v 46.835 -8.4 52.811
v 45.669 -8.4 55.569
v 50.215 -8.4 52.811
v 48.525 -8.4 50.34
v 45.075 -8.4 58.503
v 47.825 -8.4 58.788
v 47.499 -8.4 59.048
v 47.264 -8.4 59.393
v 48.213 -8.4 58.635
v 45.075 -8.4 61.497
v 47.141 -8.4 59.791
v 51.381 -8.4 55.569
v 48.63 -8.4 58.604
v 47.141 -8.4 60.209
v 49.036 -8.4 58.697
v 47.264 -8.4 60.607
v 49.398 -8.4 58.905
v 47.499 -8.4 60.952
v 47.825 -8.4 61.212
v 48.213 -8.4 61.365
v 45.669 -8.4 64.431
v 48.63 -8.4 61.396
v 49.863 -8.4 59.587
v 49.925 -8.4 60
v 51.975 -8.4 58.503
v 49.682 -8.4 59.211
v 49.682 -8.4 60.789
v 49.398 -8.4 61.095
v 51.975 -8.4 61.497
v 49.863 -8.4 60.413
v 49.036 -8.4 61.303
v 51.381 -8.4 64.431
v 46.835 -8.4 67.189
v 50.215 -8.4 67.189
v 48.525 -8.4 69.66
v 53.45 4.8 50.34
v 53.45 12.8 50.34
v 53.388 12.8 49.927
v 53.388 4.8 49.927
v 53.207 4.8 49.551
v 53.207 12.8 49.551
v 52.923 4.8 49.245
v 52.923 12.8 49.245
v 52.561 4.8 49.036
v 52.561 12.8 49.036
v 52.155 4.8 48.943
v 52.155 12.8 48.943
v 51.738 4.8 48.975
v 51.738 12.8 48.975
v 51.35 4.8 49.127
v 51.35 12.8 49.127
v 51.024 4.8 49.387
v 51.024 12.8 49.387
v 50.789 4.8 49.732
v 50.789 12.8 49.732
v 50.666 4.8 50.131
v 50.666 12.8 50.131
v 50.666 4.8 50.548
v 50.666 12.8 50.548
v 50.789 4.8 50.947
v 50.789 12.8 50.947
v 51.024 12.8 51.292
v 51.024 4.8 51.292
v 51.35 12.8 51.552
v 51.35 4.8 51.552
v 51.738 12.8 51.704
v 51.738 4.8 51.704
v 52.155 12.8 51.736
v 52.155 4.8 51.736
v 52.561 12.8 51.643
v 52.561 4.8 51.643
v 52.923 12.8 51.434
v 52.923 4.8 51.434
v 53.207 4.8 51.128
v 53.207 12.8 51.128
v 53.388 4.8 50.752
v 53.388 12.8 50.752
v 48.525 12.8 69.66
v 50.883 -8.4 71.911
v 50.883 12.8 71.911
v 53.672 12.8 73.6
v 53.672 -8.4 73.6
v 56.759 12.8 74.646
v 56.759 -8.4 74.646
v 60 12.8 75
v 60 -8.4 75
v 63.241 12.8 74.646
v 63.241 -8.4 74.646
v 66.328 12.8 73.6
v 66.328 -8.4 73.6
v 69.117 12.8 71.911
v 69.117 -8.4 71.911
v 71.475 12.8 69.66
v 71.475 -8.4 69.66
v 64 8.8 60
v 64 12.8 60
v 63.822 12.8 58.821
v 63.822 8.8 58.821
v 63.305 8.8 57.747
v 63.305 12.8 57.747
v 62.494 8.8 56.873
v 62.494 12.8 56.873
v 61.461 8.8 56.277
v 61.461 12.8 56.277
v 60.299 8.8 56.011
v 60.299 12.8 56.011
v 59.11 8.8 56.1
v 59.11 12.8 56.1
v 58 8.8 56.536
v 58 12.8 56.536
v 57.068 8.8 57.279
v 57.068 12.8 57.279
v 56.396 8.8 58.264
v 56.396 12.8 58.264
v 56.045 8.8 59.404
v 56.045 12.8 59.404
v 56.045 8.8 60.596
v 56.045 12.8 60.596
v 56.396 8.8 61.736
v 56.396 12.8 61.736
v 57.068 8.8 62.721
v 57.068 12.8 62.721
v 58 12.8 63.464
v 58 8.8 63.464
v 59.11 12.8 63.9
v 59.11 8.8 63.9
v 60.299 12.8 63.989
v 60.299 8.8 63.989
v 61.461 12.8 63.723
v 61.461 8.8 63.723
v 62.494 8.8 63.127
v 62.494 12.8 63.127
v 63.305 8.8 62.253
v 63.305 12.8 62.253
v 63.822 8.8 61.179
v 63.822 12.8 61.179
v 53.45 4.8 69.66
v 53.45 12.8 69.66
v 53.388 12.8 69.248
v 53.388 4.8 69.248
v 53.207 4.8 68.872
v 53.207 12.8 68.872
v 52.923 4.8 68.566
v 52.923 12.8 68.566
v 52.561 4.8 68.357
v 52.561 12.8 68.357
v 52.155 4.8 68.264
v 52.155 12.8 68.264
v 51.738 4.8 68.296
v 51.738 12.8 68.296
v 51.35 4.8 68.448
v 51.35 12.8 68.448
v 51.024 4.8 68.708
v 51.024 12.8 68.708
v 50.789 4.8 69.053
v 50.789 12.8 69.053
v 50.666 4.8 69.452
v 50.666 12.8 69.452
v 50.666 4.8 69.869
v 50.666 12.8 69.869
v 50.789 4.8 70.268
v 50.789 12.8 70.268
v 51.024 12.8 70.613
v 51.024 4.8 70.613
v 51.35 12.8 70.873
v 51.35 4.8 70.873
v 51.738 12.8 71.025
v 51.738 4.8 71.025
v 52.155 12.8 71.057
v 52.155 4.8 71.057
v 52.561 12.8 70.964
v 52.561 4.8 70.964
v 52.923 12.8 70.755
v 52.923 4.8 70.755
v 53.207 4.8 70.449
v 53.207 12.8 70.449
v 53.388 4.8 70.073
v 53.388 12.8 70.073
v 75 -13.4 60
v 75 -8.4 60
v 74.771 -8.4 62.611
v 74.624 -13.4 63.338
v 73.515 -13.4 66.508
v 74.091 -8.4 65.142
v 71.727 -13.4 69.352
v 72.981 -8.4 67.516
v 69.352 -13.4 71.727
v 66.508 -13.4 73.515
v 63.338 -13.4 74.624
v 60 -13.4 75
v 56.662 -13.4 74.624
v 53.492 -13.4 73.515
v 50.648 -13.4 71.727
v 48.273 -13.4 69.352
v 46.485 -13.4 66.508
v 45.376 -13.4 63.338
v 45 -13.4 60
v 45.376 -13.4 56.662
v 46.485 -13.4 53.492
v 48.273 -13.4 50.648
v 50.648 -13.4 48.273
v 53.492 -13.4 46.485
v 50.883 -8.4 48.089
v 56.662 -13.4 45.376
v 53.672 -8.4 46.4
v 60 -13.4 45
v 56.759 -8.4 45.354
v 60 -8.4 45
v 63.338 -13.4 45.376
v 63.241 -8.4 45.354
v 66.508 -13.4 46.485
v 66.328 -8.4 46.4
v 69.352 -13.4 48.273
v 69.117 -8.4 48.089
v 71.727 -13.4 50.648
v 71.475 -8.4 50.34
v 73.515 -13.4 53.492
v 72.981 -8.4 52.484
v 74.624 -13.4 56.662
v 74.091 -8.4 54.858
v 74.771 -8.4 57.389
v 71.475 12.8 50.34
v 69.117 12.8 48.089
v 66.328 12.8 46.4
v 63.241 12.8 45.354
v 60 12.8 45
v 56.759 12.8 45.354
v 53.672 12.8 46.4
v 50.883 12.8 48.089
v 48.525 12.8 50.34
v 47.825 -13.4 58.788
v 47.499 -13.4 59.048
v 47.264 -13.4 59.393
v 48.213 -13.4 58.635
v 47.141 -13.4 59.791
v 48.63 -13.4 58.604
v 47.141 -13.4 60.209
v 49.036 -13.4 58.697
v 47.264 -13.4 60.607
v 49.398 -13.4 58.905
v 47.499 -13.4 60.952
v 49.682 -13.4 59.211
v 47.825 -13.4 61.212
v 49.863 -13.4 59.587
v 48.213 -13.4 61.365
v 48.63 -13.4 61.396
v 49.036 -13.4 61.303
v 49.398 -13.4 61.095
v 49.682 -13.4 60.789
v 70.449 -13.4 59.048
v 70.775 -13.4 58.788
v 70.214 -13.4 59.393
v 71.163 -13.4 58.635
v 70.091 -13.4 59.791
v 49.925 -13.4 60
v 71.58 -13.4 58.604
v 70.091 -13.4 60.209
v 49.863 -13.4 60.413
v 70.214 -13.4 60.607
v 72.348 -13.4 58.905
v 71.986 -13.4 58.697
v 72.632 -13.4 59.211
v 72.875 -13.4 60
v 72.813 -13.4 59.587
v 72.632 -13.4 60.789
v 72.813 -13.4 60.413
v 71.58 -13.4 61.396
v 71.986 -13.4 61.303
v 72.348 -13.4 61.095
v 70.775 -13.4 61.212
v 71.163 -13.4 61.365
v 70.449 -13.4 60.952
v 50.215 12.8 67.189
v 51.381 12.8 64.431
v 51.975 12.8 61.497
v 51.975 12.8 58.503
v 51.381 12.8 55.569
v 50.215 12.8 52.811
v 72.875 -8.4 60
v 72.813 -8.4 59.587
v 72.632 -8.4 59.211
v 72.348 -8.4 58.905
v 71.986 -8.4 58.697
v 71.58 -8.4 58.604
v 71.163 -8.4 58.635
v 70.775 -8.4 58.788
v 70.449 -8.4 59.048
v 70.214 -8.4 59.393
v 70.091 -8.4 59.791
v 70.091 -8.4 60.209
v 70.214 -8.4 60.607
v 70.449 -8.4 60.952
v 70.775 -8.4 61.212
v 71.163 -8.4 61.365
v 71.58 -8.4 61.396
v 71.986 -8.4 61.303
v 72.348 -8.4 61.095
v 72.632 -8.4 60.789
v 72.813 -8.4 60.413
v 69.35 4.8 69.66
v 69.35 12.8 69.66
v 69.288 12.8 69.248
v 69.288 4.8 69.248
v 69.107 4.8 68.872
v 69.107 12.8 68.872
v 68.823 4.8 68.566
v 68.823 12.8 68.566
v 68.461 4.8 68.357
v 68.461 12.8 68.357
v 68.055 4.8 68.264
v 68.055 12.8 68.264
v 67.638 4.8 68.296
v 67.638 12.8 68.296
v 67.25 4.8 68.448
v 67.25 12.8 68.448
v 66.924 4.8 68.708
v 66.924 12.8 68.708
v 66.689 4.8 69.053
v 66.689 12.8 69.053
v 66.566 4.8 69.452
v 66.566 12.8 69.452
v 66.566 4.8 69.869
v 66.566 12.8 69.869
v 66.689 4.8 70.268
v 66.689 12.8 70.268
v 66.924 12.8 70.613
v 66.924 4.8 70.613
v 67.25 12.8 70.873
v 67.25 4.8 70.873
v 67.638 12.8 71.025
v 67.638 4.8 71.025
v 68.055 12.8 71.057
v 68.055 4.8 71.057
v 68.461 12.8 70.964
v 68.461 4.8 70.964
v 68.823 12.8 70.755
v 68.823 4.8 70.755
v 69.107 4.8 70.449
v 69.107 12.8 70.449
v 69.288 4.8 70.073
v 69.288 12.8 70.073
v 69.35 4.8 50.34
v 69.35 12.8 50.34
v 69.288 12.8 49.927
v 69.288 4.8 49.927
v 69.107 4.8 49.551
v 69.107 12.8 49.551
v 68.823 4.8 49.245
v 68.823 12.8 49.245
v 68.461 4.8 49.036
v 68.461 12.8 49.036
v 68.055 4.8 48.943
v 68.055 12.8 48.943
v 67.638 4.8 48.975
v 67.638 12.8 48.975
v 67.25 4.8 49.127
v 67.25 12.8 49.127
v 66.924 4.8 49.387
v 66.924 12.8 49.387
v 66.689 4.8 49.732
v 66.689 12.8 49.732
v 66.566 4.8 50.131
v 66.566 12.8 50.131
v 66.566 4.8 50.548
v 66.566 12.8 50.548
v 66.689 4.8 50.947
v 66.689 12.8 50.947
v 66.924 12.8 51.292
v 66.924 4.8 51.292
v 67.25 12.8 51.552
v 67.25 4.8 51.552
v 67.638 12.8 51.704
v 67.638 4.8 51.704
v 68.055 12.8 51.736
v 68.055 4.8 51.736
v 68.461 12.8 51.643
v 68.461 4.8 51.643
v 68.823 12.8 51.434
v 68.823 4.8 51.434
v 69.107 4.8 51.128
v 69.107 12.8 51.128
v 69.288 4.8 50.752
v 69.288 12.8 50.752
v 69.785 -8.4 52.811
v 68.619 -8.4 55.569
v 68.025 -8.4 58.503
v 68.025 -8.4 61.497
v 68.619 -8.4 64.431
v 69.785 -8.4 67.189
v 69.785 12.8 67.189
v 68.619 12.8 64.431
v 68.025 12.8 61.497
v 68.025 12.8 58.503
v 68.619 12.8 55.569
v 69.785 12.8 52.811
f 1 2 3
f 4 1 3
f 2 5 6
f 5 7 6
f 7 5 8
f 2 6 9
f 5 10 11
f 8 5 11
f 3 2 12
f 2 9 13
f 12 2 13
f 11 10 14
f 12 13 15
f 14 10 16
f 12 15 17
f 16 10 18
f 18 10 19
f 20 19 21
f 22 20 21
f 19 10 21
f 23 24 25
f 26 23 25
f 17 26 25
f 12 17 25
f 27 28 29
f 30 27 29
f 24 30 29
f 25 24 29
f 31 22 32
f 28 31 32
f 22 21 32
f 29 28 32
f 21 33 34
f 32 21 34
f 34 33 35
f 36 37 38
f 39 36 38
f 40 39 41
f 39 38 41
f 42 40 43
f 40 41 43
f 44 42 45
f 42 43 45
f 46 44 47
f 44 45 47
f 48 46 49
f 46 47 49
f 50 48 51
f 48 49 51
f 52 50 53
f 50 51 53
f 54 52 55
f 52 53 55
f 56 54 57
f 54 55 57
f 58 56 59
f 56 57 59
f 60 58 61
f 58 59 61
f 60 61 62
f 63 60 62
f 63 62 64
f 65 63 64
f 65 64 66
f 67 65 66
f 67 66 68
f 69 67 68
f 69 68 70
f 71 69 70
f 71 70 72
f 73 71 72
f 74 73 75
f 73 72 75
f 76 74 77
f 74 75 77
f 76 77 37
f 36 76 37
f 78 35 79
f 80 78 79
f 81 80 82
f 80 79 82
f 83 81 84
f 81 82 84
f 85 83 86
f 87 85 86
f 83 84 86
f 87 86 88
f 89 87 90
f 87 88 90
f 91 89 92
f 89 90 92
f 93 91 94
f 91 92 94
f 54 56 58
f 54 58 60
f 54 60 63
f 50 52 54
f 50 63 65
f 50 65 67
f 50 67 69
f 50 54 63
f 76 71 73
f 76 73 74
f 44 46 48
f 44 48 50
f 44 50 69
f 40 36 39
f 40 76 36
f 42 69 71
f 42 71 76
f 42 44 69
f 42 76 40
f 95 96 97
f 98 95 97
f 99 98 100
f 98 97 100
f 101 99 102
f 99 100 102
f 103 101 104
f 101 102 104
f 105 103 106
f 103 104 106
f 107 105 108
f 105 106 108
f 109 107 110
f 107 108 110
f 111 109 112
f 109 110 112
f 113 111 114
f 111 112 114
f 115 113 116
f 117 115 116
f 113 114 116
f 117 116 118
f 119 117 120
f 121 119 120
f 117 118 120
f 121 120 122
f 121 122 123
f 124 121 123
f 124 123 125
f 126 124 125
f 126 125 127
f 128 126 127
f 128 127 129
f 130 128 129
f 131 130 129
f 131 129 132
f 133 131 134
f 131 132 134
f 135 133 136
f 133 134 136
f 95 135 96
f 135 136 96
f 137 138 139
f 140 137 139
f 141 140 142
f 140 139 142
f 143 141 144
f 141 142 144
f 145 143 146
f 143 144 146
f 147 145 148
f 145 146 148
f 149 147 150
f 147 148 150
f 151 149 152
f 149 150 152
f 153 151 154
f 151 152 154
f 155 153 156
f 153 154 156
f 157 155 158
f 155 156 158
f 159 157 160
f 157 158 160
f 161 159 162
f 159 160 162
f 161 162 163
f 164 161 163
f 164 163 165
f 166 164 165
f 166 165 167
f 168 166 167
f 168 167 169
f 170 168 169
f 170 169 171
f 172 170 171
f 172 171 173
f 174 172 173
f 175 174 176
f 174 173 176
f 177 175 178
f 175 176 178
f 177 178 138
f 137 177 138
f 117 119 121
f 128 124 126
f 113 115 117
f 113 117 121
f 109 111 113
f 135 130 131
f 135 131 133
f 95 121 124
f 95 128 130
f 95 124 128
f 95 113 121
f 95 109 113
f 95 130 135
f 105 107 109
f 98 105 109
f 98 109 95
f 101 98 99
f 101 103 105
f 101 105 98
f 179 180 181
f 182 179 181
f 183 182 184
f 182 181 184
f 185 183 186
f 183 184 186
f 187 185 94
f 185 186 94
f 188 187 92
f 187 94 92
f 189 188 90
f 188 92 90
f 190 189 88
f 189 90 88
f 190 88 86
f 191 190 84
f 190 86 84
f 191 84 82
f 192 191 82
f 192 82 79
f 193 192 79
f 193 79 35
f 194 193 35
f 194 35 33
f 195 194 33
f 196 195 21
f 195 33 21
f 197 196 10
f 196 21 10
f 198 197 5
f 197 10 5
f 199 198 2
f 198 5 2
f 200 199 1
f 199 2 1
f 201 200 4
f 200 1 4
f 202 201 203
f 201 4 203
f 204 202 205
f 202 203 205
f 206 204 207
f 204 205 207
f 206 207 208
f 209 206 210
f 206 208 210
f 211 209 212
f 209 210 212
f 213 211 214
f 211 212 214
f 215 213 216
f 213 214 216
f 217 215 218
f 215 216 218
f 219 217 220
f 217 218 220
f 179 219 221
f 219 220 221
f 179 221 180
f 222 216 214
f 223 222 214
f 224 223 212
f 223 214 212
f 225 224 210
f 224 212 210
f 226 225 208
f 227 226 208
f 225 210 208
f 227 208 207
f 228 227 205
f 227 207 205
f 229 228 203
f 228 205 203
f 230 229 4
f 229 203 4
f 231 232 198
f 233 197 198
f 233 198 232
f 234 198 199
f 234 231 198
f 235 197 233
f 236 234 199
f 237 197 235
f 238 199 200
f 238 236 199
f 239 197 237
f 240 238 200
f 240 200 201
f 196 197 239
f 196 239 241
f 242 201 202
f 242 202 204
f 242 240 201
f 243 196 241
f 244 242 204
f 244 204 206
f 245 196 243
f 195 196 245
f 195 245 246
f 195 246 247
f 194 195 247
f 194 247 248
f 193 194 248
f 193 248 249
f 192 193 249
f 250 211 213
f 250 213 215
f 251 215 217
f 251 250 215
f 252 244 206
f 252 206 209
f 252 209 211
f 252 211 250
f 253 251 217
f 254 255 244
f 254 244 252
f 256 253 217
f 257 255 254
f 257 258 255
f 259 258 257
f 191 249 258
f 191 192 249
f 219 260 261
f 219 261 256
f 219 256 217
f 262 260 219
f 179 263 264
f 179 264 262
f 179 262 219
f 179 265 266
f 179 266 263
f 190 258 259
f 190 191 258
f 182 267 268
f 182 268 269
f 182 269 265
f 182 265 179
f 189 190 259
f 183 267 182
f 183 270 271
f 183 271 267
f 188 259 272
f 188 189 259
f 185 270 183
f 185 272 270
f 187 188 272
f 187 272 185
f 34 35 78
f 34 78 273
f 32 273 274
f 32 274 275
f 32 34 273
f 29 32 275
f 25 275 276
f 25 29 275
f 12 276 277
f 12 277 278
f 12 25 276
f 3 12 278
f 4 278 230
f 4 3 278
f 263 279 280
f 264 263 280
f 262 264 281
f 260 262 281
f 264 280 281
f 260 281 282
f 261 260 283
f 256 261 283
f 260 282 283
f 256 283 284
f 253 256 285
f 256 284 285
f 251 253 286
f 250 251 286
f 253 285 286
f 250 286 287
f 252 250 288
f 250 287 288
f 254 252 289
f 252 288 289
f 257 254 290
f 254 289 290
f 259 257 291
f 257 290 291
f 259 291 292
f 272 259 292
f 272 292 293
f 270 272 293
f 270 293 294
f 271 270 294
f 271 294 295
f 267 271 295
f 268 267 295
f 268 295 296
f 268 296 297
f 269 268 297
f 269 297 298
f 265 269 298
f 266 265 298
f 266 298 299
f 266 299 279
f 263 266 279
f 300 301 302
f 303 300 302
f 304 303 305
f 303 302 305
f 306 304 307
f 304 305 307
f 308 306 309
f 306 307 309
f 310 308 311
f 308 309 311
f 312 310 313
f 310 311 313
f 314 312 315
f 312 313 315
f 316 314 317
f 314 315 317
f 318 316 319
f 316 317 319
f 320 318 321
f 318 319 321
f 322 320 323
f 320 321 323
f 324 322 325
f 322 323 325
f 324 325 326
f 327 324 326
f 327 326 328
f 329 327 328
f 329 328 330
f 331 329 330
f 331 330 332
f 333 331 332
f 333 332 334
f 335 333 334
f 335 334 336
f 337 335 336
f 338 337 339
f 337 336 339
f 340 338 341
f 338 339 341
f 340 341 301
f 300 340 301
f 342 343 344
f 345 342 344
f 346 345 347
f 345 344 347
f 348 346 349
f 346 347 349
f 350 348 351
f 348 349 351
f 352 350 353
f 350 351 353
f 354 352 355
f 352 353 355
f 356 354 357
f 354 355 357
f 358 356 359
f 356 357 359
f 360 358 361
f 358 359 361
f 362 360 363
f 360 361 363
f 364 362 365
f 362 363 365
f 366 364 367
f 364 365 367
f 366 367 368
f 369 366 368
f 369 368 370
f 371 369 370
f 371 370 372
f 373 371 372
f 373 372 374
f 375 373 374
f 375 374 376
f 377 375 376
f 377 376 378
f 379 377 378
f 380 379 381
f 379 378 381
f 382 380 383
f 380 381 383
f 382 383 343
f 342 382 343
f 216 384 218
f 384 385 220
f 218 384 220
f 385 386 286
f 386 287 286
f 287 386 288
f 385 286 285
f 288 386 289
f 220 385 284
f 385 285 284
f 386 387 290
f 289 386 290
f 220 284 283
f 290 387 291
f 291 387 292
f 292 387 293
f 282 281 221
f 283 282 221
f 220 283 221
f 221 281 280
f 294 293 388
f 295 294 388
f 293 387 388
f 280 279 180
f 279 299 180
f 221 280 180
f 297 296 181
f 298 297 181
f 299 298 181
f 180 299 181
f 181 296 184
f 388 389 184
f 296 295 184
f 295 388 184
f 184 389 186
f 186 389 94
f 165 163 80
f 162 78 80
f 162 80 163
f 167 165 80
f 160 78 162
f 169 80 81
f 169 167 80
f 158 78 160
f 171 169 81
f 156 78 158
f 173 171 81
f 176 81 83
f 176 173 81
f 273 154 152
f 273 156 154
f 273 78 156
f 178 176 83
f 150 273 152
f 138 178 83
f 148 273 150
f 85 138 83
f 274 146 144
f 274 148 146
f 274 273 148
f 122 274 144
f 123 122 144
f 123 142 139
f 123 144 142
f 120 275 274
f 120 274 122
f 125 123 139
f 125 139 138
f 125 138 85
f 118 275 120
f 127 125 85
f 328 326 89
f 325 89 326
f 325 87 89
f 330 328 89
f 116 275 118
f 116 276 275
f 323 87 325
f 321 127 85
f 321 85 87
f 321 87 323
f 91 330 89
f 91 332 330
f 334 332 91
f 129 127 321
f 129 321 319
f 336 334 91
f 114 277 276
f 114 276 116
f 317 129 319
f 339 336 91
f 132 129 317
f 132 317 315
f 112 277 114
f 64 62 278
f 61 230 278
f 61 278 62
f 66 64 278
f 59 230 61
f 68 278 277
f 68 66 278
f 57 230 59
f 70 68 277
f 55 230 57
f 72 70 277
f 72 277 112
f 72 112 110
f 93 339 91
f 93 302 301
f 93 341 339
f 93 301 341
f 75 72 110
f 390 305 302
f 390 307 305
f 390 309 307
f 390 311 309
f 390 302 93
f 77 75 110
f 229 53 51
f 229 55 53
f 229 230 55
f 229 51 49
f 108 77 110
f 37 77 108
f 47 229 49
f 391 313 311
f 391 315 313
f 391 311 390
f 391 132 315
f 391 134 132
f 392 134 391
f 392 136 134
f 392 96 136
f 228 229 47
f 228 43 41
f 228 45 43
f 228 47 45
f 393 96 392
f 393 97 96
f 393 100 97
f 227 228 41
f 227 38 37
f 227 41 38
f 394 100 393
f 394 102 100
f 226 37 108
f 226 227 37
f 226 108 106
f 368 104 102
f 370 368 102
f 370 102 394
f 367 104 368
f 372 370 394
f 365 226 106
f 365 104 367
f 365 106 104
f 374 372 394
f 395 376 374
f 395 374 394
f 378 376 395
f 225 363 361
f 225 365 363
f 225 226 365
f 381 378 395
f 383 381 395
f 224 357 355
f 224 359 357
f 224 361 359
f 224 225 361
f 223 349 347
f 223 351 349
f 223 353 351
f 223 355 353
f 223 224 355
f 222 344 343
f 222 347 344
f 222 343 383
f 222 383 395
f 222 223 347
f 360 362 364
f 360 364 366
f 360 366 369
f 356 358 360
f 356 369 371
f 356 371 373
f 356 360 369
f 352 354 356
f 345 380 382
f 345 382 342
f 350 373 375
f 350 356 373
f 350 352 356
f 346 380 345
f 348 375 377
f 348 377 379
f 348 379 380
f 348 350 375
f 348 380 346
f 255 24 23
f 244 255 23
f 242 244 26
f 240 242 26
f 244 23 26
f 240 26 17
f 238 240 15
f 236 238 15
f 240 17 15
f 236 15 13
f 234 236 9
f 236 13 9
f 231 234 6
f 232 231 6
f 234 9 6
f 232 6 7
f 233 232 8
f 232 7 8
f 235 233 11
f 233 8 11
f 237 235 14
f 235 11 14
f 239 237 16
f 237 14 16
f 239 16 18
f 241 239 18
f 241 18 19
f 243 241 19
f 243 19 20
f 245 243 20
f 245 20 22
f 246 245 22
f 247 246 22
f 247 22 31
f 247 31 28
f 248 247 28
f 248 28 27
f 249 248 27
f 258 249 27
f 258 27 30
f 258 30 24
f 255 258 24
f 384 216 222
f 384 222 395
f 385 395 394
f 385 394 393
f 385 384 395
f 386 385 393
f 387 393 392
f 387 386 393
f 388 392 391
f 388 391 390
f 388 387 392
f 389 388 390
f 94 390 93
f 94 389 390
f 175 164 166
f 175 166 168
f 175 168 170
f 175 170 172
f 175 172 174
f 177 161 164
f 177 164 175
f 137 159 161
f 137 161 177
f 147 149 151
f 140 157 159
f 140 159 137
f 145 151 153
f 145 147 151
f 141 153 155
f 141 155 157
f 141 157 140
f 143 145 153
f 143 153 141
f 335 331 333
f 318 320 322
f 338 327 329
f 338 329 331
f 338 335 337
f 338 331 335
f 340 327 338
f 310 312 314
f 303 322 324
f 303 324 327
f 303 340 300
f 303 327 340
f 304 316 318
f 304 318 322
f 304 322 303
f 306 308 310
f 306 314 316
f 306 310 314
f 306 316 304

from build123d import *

# Parameters (mm, degrees)
SKETCH073_R     = 15
PAD017_DEPTH    = 5
SKETCH074_R     = 1.4
POCKET046_DEPTH = 5.001
PAD018_DEPTH    = 21.2
SKETCH_R        = 4
POCKET_DEPTH    = 4
SKETCH076_R     = 1.4
POCKET048_DEPTH = 8


with BuildPart() as part:
    # Sketch073 → Pad017 (new body)
    with BuildSketch(Plane.XZ):
        Circle(SKETCH073_R)
    extrude(amount=PAD017_DEPTH)

    # Sketch074 (on Face2 of Pad017) → Pocket046 (cut, through all)
    with BuildSketch(Plane(origin=(0, 0, 0), x_dir=(1, 0, 0), z_dir=(0, 1, 0))):
        with Locations((-11.475, 0)):
            Circle(SKETCH074_R)
        with Locations((11.475, 0)):
            Circle(SKETCH074_R)
    extrude(amount=-POCKET046_DEPTH, mode=Mode.SUBTRACT)

    # Sketch075 (on Face2 of Pocket046) → Pad018 (join)
    with BuildSketch(Plane(origin=(0, 0, 0), x_dir=(1, 0, 0), z_dir=(0, 1, 0))):
        with BuildLine():
            ThreePointArc((11.475, 9.660454), (0, 15), (-11.475, 9.660454))
            ThreePointArc((-11.475, -9.660454), (-7.95, 0), (-11.475, 9.660454))
            ThreePointArc((-11.475, -9.660454), (0, -15), (11.475, -9.660454))
            ThreePointArc((11.475, 9.660454), (7.95, 0), (11.475, -9.660454))
        make_face()
    extrude(amount=PAD018_DEPTH)

    # Sketch (on Face10 of Pad018) → Pocket (cut)
    with BuildSketch(Plane(origin=(0, 21.2, 0), x_dir=(1, 0, 0), z_dir=(0, 1, 0))):
        Circle(SKETCH_R)
    extrude(amount=-POCKET_DEPTH, mode=Mode.SUBTRACT)

    # Sketch076 (on Face10 of Pocket) → Pocket048 (cut)
    with BuildSketch(Plane(origin=(0, 21.2, 0), x_dir=(1, 0, 0), z_dir=(0, 1, 0))):
        with Locations((-7.95, 9.660454)):
            Circle(SKETCH076_R)
        with Locations((7.95, 9.660454)):
            Circle(SKETCH076_R)
        with Locations((-7.95, -9.660454)):
            Circle(SKETCH076_R)
        with Locations((7.95, -9.660454)):
            Circle(SKETCH076_R)
    extrude(amount=-POCKET048_DEPTH, mode=Mode.SUBTRACT)


with BuildPart() as part_1:
    # Body001 placement: moved
    add(part.part.moved(Location((60, -8.4, 60))))


solid = part_1.part
